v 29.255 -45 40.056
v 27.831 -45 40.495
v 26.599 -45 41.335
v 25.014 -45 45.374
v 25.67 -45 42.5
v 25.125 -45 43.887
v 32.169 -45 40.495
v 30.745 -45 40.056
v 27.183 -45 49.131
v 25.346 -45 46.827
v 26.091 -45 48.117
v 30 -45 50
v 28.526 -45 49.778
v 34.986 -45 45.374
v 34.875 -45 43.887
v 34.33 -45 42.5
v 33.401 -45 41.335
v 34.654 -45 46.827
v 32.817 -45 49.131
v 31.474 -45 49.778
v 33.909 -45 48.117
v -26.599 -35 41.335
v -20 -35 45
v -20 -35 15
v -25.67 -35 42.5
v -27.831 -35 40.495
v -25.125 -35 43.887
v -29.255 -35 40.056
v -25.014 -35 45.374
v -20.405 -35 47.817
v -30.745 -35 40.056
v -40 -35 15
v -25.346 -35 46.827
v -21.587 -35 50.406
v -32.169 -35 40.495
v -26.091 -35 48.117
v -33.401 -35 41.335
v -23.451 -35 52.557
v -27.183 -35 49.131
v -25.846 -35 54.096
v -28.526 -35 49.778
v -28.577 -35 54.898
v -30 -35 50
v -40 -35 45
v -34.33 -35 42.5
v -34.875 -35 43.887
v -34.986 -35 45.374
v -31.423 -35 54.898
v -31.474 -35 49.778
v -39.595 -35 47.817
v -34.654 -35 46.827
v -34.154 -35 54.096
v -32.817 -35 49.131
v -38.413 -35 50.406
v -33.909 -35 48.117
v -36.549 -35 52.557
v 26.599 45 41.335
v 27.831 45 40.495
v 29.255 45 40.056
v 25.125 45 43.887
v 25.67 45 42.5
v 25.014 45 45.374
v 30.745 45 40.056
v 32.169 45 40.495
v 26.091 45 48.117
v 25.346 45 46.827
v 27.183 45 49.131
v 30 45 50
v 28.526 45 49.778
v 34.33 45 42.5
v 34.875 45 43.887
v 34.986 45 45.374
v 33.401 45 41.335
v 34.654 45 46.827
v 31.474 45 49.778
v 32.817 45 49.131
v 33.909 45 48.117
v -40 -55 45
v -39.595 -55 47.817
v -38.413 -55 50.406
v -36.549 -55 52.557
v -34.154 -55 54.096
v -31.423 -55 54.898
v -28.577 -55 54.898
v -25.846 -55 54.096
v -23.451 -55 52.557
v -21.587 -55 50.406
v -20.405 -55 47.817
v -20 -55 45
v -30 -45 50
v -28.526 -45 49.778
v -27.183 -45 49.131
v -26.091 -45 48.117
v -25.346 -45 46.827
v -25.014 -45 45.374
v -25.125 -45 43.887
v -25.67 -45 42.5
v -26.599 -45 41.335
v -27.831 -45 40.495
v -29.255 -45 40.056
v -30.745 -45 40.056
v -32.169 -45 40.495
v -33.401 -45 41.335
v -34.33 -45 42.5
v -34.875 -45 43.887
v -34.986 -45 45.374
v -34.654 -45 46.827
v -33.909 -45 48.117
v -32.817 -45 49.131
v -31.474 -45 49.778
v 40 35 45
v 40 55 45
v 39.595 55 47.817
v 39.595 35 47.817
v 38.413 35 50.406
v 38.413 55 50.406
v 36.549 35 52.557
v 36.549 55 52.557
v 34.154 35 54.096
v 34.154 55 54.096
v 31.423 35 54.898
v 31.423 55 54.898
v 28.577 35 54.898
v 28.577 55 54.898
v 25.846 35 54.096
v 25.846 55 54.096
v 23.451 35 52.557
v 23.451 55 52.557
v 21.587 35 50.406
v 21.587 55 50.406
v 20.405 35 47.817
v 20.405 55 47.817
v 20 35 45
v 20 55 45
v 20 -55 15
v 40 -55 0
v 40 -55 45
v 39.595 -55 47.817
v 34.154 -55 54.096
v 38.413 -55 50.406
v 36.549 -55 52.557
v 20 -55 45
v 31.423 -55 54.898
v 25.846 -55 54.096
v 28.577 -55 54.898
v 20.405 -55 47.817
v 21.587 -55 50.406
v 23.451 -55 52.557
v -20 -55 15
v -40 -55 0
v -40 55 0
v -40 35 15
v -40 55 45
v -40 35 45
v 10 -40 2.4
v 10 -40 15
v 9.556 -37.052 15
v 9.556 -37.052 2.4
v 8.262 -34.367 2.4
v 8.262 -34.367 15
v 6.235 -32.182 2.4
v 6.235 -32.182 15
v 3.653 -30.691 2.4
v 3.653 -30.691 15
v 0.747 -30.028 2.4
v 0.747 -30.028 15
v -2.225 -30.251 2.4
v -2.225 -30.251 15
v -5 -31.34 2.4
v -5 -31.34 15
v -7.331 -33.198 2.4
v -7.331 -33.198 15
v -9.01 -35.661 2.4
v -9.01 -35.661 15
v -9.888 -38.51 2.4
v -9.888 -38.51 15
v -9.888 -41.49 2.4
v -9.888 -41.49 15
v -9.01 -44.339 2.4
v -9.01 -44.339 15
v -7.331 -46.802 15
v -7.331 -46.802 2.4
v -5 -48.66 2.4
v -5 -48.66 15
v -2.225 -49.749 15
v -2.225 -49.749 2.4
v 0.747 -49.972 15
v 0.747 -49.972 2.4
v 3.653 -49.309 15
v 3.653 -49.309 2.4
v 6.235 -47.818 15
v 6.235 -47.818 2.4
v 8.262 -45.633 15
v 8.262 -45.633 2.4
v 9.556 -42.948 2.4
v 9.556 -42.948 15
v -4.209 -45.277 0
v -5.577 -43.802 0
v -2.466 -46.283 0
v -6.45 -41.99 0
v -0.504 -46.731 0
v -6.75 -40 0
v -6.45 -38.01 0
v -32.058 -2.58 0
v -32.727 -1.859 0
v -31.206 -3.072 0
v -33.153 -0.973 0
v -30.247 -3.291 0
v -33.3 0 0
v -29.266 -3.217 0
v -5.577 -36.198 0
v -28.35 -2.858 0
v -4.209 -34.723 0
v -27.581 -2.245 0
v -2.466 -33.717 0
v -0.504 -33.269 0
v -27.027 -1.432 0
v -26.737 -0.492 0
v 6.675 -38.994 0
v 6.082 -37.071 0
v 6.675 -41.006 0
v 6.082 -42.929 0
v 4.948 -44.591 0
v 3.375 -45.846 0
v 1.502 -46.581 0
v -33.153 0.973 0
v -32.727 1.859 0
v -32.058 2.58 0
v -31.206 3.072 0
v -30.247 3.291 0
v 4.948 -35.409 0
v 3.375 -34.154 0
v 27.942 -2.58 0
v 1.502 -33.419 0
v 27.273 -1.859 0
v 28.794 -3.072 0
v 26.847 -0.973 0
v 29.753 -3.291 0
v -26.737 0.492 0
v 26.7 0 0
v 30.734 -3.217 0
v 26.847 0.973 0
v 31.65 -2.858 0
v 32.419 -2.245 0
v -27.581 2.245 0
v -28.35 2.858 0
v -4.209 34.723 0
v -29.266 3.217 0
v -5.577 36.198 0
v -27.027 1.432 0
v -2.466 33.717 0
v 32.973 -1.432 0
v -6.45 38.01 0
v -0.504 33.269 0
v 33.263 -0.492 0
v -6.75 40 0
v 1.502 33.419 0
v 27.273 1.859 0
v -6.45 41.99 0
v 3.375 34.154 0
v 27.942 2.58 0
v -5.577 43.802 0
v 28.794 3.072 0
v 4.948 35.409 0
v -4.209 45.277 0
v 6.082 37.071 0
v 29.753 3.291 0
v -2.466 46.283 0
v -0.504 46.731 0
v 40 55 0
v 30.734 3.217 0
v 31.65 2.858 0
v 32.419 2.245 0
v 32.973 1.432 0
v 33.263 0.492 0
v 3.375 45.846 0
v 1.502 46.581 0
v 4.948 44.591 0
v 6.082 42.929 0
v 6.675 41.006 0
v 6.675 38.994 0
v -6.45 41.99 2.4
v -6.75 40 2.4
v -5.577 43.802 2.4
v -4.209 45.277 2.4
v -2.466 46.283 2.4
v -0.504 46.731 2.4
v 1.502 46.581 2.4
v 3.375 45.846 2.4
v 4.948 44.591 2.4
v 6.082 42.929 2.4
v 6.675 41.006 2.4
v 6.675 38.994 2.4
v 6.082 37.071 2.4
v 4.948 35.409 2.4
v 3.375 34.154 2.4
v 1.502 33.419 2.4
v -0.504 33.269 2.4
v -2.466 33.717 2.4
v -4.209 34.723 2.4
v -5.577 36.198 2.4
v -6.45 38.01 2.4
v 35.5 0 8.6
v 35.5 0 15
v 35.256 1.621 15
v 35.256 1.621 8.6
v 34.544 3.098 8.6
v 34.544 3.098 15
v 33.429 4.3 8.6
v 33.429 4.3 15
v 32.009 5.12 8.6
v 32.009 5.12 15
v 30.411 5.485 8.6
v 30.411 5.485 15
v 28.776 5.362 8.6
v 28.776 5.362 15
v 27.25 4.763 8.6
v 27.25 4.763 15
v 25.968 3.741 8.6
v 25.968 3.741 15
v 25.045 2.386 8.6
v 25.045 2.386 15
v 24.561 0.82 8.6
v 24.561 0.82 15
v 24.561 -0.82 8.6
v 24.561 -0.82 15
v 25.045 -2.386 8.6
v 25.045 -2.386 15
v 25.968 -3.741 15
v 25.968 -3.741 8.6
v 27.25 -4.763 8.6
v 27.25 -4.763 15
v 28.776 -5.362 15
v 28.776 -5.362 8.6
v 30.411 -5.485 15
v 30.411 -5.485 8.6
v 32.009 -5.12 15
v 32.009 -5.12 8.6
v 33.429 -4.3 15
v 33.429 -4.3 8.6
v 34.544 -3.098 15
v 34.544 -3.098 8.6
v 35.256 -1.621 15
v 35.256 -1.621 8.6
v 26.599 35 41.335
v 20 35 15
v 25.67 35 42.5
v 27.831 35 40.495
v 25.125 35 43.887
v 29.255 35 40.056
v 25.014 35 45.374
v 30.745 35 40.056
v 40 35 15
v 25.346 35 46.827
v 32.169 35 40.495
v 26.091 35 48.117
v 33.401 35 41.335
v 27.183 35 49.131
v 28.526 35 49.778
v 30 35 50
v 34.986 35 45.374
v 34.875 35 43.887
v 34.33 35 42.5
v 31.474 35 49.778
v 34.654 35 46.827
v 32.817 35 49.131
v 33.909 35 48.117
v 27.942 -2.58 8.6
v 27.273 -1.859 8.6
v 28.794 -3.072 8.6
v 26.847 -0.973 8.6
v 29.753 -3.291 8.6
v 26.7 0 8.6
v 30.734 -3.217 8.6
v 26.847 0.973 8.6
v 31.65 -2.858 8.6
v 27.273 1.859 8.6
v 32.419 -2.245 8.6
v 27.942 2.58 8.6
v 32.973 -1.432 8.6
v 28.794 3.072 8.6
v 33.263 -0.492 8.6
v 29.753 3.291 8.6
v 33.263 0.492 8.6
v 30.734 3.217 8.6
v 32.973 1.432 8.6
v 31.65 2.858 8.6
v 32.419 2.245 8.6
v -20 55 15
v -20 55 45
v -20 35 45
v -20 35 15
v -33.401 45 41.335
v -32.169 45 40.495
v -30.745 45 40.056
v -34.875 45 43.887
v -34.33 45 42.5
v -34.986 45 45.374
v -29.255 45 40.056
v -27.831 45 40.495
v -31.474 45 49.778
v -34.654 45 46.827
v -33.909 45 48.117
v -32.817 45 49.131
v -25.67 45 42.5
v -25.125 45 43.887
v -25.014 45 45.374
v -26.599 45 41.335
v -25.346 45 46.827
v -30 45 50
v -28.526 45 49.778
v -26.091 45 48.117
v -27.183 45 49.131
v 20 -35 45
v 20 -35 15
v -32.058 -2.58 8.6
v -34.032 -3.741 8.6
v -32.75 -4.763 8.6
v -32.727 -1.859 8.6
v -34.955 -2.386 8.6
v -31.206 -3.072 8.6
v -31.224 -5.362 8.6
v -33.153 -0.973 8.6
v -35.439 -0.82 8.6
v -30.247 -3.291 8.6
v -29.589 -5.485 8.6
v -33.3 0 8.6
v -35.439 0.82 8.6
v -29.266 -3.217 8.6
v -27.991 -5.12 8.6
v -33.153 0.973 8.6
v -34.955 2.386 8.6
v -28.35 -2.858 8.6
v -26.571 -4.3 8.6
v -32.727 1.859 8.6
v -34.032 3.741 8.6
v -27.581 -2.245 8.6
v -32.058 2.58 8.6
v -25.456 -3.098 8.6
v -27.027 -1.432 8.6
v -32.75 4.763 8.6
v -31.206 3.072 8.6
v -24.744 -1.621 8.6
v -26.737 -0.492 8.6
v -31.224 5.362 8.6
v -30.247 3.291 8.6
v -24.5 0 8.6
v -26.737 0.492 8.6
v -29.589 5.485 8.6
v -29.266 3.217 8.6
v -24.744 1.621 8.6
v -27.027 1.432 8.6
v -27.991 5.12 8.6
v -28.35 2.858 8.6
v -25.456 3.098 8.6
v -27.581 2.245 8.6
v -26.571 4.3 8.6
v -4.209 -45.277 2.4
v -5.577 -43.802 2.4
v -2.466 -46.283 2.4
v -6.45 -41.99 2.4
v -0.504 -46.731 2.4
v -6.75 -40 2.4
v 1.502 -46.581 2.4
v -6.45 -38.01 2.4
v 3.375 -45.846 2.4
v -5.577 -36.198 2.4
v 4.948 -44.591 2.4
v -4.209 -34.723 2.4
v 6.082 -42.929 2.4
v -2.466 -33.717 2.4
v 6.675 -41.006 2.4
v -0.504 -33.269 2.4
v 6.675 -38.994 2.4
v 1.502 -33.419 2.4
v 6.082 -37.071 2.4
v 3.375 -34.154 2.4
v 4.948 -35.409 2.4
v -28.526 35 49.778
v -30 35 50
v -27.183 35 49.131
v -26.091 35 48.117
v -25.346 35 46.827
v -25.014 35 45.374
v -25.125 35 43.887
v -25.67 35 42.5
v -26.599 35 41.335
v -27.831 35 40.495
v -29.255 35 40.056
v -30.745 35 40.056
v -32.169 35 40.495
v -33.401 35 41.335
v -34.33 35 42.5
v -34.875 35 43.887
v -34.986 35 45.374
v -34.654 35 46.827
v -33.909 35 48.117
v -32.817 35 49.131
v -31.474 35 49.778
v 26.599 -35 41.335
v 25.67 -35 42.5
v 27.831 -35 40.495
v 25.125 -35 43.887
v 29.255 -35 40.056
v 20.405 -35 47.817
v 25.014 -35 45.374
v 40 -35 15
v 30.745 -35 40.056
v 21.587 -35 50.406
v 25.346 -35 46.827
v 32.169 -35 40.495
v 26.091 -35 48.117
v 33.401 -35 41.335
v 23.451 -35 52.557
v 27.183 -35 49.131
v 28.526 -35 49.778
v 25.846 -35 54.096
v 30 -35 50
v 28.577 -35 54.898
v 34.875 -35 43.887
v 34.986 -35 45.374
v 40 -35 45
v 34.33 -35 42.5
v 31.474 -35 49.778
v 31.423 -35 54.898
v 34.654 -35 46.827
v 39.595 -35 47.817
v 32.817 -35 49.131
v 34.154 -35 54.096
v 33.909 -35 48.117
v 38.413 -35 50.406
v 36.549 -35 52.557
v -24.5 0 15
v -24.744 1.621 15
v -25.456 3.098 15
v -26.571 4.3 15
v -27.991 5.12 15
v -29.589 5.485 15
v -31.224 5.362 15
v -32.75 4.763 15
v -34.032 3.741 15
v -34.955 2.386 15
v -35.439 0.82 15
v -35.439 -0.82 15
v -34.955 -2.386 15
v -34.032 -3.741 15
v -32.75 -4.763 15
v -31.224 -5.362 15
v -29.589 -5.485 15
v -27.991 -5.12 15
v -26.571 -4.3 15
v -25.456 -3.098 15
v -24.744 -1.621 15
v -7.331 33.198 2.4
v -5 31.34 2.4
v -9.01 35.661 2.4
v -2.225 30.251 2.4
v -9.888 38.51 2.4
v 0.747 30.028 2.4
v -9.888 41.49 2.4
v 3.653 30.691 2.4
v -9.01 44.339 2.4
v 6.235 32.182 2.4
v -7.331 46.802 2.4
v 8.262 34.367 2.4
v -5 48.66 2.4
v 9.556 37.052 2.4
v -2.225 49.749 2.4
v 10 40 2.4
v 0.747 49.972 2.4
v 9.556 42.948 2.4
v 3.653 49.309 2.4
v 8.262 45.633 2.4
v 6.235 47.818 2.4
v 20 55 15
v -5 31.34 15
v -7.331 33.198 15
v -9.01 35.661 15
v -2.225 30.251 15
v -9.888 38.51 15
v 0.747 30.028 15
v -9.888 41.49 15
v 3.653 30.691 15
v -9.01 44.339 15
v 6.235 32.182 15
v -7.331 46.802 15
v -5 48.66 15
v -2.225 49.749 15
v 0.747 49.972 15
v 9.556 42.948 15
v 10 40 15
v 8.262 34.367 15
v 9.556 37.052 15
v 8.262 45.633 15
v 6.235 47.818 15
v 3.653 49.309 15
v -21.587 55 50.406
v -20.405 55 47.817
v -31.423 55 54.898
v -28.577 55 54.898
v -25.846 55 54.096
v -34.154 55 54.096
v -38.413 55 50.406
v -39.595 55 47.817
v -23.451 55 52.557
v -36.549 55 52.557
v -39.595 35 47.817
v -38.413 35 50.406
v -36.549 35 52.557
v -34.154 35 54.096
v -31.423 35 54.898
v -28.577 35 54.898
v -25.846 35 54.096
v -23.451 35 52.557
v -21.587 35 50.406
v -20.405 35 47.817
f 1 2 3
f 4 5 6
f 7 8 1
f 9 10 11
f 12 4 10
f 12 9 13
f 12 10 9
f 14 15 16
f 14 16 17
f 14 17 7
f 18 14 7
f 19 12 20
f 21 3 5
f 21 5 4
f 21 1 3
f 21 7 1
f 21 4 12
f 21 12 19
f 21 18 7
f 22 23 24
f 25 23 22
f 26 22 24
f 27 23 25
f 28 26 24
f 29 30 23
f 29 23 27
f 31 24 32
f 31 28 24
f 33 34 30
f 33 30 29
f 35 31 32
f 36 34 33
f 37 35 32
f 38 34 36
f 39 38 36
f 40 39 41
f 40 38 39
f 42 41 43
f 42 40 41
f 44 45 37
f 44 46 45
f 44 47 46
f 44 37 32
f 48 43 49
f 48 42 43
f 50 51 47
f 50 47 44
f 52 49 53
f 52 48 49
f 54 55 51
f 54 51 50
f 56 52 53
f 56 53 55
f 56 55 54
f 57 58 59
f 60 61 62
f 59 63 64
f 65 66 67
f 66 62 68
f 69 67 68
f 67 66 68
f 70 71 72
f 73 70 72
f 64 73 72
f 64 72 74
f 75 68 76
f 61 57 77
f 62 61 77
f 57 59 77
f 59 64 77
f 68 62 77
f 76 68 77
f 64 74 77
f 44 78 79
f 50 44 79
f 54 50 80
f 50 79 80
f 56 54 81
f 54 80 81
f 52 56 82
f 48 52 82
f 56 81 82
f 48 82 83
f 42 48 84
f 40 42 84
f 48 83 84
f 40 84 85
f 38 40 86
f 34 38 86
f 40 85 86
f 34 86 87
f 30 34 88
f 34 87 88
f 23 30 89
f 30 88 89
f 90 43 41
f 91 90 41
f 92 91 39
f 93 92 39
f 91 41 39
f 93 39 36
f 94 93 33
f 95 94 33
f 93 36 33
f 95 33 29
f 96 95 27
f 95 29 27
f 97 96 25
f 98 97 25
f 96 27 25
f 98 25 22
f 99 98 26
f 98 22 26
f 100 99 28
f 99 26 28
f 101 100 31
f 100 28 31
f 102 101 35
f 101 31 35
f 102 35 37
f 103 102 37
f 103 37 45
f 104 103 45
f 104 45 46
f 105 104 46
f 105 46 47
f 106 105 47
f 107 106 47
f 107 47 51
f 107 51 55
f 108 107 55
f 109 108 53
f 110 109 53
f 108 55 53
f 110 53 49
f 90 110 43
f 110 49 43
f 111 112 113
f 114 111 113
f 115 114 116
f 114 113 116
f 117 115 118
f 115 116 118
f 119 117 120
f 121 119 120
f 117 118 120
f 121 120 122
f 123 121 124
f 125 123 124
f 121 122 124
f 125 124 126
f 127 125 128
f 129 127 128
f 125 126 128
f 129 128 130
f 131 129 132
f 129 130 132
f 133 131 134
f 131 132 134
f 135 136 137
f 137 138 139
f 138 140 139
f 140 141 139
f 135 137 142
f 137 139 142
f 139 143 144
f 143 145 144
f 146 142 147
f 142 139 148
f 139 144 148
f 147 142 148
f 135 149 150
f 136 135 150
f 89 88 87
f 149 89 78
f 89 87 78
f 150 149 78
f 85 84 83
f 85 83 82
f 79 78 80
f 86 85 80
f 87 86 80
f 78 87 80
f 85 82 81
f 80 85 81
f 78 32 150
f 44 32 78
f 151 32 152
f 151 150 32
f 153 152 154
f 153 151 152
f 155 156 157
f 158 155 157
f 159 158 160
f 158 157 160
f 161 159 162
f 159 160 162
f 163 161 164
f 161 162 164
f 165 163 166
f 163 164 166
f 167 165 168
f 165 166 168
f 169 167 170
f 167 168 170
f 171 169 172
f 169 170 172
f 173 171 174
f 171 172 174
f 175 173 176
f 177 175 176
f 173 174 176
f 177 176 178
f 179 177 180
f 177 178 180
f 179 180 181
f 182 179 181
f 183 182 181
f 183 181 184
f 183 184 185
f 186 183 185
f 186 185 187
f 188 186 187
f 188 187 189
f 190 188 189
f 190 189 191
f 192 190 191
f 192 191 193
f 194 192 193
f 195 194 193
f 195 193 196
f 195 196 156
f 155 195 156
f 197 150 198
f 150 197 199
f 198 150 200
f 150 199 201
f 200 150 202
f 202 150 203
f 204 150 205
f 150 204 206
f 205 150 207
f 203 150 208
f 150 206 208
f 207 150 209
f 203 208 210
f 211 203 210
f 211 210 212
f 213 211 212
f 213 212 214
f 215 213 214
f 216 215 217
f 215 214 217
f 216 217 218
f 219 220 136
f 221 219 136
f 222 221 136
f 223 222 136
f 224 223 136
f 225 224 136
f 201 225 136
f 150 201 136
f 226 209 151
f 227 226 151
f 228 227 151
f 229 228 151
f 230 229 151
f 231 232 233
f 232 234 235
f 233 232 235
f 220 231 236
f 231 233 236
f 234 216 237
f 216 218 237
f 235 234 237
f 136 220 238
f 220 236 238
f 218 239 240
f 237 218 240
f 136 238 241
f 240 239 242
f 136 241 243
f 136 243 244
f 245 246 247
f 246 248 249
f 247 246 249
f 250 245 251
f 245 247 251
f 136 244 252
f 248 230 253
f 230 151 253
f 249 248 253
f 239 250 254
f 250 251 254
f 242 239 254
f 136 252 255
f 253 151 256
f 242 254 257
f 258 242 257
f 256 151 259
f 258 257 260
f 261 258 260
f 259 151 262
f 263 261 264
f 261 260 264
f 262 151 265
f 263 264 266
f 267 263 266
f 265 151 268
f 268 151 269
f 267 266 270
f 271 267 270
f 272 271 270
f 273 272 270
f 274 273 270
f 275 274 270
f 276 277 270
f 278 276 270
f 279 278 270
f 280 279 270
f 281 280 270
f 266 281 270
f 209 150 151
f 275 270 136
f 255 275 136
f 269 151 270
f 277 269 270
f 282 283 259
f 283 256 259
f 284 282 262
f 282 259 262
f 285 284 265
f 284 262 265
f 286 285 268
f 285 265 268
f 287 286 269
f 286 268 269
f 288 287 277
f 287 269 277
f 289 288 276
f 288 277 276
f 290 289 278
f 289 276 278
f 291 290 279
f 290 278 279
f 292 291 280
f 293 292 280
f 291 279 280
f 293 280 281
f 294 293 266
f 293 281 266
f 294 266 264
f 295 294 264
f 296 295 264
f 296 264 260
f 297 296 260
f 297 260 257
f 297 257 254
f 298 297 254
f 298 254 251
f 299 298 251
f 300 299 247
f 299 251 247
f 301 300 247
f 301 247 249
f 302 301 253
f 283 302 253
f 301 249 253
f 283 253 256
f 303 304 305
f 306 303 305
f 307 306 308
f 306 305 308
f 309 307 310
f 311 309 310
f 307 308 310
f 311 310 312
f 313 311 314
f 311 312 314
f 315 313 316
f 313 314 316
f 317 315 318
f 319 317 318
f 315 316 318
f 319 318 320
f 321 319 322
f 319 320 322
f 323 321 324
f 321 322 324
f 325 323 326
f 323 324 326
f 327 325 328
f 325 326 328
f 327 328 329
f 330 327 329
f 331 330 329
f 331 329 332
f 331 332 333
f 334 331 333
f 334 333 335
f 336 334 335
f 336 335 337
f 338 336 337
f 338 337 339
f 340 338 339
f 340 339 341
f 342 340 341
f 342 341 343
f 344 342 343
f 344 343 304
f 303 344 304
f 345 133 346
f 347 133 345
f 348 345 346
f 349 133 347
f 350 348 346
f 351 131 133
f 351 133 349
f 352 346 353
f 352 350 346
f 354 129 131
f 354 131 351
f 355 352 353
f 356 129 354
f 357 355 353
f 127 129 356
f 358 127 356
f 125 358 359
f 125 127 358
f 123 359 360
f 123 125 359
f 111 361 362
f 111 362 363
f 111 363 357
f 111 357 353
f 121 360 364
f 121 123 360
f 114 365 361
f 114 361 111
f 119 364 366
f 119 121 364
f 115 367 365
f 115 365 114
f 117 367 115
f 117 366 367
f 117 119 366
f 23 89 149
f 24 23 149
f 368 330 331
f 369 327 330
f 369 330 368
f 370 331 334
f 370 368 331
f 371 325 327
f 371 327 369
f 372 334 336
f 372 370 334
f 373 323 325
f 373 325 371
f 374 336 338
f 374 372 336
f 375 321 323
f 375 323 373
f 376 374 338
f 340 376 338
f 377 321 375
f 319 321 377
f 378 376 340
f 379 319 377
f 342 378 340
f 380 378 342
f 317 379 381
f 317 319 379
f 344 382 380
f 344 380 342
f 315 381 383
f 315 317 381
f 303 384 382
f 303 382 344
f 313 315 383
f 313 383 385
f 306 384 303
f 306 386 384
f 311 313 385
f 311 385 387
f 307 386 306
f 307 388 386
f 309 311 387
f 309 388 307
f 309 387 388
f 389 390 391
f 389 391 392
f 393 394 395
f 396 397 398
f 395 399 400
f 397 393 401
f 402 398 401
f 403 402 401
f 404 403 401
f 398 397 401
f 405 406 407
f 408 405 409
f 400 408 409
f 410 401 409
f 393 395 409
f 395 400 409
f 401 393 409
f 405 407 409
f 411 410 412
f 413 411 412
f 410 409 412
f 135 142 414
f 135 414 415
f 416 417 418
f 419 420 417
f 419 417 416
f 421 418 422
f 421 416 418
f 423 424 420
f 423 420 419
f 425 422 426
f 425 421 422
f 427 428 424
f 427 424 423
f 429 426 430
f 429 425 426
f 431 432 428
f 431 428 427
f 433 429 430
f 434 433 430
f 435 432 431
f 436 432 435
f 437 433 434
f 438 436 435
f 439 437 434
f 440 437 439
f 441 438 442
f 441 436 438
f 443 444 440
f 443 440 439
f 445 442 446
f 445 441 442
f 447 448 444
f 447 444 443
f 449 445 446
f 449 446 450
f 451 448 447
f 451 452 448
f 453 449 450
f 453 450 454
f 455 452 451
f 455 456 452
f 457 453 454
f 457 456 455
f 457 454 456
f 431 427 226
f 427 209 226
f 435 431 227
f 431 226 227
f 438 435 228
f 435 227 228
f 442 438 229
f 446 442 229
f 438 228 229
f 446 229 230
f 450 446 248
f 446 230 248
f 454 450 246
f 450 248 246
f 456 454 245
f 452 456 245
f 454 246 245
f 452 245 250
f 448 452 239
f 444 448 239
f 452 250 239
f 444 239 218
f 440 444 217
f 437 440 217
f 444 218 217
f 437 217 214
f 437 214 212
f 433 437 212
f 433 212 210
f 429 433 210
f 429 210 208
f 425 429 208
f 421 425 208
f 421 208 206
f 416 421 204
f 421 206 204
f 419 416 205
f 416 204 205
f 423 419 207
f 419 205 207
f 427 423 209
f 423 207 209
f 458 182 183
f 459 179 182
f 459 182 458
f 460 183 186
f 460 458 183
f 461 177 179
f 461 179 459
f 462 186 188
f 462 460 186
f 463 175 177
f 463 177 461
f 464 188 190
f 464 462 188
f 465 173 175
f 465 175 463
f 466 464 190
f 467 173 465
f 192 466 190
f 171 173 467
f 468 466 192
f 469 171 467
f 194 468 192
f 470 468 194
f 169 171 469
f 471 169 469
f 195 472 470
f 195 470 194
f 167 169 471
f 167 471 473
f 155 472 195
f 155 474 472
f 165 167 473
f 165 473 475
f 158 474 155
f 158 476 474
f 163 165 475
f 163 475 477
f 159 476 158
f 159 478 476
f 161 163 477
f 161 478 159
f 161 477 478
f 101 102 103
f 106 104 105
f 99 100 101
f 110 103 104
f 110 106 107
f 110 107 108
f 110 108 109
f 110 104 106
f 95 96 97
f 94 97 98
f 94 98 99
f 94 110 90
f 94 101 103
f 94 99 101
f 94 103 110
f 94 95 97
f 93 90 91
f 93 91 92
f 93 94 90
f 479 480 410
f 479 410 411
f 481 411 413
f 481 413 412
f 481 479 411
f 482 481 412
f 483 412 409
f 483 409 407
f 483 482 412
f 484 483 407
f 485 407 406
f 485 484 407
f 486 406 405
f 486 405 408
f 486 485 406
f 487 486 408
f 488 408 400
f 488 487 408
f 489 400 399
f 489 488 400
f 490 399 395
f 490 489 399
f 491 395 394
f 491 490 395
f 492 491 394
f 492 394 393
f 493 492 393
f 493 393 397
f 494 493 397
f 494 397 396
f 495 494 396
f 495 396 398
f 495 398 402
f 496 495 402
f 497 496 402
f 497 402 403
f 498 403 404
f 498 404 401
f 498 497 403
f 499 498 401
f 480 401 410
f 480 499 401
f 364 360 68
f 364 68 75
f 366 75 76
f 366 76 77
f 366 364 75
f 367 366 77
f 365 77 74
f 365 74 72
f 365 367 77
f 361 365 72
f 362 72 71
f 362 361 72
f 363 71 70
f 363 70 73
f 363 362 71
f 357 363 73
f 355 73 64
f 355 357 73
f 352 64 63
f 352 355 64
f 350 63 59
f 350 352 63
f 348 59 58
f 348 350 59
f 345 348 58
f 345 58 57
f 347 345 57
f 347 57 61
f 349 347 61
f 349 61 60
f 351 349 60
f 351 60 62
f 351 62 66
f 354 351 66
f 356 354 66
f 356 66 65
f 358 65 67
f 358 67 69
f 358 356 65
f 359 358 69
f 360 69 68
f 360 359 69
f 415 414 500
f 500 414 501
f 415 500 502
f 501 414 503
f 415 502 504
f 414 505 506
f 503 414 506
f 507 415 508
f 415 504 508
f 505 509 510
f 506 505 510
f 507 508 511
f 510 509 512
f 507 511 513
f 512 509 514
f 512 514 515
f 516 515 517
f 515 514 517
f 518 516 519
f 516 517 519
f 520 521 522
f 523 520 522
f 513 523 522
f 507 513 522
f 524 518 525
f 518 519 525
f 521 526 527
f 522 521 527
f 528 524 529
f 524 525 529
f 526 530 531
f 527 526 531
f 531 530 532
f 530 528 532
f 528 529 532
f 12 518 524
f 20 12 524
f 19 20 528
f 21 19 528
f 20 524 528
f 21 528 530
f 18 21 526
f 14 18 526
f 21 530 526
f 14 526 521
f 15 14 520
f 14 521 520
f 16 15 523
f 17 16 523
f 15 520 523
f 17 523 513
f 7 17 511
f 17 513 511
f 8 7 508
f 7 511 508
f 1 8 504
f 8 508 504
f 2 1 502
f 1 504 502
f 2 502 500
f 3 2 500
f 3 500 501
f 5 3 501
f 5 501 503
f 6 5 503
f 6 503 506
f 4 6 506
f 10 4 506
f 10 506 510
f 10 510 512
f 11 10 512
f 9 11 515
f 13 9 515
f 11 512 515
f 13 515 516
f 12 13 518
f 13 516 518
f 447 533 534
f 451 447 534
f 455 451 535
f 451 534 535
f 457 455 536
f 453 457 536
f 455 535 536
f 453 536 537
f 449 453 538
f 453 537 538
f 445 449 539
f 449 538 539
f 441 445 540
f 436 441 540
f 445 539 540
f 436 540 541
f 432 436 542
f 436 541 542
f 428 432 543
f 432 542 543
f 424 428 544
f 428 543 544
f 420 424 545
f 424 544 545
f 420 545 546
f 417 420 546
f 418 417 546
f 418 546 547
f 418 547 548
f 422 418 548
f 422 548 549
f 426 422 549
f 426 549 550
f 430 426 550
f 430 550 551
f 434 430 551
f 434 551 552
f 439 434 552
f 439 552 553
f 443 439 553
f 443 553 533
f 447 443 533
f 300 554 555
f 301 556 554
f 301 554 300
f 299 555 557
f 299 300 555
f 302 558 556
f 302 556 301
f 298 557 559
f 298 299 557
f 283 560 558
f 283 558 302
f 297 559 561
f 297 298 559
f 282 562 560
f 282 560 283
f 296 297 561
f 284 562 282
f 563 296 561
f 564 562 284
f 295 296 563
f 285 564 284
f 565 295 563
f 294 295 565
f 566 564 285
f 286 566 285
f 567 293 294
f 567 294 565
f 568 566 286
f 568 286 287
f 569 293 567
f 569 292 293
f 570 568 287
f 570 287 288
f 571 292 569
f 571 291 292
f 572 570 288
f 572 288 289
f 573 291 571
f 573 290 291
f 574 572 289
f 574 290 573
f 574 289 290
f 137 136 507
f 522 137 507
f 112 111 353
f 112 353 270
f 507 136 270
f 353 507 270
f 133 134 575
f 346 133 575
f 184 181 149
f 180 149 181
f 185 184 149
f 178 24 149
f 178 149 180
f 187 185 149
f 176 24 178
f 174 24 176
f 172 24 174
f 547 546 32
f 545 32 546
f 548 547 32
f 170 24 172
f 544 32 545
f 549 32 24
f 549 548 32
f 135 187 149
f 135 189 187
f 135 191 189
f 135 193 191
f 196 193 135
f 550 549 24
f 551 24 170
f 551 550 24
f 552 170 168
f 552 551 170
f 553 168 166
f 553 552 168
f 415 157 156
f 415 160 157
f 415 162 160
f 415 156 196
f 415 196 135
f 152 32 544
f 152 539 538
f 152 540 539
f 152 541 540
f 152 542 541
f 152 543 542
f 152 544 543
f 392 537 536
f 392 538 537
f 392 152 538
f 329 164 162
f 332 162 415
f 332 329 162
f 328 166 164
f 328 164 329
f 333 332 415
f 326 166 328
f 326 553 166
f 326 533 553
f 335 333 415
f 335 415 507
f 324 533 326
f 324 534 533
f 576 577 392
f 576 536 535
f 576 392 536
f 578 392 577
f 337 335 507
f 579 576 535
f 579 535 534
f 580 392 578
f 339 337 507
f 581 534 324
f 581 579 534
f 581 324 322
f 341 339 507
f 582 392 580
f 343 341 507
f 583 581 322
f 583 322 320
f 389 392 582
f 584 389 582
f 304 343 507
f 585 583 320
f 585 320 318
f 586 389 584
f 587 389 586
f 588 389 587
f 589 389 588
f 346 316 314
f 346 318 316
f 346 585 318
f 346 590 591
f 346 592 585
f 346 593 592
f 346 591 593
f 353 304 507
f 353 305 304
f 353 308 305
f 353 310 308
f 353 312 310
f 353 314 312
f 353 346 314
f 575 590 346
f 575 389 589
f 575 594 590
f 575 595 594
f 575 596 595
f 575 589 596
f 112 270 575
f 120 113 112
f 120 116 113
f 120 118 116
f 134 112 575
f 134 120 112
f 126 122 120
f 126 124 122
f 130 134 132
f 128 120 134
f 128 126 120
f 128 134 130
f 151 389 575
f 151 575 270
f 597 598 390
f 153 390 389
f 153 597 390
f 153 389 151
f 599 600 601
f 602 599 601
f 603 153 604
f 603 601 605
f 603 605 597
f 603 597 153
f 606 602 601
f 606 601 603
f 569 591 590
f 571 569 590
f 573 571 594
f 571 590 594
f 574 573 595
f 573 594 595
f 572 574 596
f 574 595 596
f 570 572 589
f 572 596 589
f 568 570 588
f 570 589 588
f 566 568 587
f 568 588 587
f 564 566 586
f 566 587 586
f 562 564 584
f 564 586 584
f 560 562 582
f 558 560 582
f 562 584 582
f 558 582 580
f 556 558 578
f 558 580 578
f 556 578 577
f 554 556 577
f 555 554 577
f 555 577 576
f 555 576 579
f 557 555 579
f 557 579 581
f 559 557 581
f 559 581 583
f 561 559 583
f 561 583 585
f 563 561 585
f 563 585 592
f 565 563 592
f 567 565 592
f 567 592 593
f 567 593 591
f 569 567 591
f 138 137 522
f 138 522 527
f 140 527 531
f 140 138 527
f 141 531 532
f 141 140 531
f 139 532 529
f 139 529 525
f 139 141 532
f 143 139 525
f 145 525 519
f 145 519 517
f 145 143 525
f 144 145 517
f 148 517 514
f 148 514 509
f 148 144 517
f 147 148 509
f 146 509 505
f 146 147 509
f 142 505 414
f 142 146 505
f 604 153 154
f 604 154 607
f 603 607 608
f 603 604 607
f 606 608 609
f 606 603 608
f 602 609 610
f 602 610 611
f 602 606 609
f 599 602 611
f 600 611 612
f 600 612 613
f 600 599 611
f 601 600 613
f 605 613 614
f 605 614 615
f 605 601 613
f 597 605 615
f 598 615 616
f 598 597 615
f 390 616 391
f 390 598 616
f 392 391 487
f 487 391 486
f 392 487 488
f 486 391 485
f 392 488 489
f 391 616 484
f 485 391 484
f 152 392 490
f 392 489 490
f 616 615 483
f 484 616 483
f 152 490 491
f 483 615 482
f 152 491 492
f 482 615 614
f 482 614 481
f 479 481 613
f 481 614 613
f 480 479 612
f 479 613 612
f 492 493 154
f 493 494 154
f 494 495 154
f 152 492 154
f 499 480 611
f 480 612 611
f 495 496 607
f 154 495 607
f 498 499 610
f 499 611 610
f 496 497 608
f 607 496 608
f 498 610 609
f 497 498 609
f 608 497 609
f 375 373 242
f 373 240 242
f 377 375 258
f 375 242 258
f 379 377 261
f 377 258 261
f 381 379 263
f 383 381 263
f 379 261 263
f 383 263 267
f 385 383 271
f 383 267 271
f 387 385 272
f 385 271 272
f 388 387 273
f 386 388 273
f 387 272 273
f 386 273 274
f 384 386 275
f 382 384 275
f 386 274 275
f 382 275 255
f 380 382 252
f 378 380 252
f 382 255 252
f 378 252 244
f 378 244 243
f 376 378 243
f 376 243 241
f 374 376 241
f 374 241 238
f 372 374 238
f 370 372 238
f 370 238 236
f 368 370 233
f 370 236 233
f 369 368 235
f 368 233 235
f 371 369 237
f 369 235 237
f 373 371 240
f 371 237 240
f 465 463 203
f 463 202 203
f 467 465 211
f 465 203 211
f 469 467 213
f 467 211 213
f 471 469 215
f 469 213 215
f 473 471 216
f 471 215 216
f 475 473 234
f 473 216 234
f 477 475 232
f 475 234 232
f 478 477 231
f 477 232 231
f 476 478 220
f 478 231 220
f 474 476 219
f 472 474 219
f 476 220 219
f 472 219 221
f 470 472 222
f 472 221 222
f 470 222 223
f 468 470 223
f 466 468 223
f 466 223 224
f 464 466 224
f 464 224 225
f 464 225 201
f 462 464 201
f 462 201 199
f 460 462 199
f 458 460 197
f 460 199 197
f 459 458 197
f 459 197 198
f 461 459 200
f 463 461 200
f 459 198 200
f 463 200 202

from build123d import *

# Parameters (mm, degrees)
SKETCH_1_W                    = 80
SKETCH_1_H                    = 110
EXTRUDE_1_DEPTH               = 15
HOLE_WIZARD_M12_1_D           = 13.5
HOLE_WIZARD_M12_1_CBORE_D     = 20
HOLE_WIZARD_M12_1_CBORE_DEPTH = 12.6
EXTRUDE_2_DEPTH               = 20
SKETCH_5_R                    = 5
CUT_EXTRUDE_1_DEPTH           = 10
HOLE_WIZARD_M6_1_D            = 6.6
HOLE_WIZARD_M6_1_CBORE_D      = 11
HOLE_WIZARD_M6_1_CBORE_DEPTH  = 6.4


with BuildPart() as part:
    # 草图1 → 凸台-拉伸1 (new body)
    with BuildSketch(Plane.XY):
        Rectangle(SKETCH_1_W, SKETCH_1_H)
    extrude(amount=EXTRUDE_1_DEPTH)

    # M12 六角凹头螺钉的柱形沉头孔1 (through all)
    with Locations(Plane.XY.offset(15)):
        with Locations((0, 40), (0, -40)):
            CounterBoreHole(HOLE_WIZARD_M12_1_D / 2, HOLE_WIZARD_M12_1_CBORE_D / 2, HOLE_WIZARD_M12_1_CBORE_DEPTH)

    # 草图4 → 凸台-拉伸2 (add)
    with BuildSketch(Plane.XZ.offset(55)):
        with BuildLine():
            Line((-40, 15), (-40, 45))
            ThreePointArc((-40, 45), (-30, 55), (-20, 45))
            Line((-20, 45), (-20, 15))
            Line((-20, 15), (-40, 15))
        make_face()
        with BuildLine():
            Line((40, 15), (40, 45))
            ThreePointArc((40, 45), (30, 55), (20, 45))
            Line((20, 45), (20, 15))
            Line((20, 15), (40, 15))
        make_face()
    extrude_2 = extrude(amount=-EXTRUDE_2_DEPTH)

    # 镜向1: 凸台-拉伸2 across plane
    add(extrude_2.mirror(Plane(origin=(0, 0, 0), x_dir=(0, 0, 1), z_dir=(0, -1, 0))))

    # 草图5 → 切除-拉伸1 (cut)
    with BuildSketch(Plane(origin=(0, -35, 0), x_dir=(1, 0, 0), z_dir=(0, 1, 0))):
        with Locations(Location((30, -45, 0), (0, 0, 270))):
            Circle(SKETCH_5_R)
        with Locations(Location((-30, -45, 0), (0, 0, 270))):
            Circle(SKETCH_5_R)
    cut_extrude_1 = extrude(amount=-CUT_EXTRUDE_1_DEPTH, mode=Mode.SUBTRACT)

    # 镜向2: 切除-拉伸1 across plane
    add(cut_extrude_1.mirror(Plane(origin=(0, 0, 0), x_dir=(0, 0, 1), z_dir=(0, -1, 0))), mode=Mode.SUBTRACT)

    # M6 六角凹头螺钉的柱形沉头孔1 (through all)
    with Locations(Plane.XY.offset(15)):
        with Locations((-30, 0), (30, 0)):
            CounterBoreHole(HOLE_WIZARD_M6_1_D / 2, HOLE_WIZARD_M6_1_CBORE_D / 2, HOLE_WIZARD_M6_1_CBORE_DEPTH)


solid = part.part
